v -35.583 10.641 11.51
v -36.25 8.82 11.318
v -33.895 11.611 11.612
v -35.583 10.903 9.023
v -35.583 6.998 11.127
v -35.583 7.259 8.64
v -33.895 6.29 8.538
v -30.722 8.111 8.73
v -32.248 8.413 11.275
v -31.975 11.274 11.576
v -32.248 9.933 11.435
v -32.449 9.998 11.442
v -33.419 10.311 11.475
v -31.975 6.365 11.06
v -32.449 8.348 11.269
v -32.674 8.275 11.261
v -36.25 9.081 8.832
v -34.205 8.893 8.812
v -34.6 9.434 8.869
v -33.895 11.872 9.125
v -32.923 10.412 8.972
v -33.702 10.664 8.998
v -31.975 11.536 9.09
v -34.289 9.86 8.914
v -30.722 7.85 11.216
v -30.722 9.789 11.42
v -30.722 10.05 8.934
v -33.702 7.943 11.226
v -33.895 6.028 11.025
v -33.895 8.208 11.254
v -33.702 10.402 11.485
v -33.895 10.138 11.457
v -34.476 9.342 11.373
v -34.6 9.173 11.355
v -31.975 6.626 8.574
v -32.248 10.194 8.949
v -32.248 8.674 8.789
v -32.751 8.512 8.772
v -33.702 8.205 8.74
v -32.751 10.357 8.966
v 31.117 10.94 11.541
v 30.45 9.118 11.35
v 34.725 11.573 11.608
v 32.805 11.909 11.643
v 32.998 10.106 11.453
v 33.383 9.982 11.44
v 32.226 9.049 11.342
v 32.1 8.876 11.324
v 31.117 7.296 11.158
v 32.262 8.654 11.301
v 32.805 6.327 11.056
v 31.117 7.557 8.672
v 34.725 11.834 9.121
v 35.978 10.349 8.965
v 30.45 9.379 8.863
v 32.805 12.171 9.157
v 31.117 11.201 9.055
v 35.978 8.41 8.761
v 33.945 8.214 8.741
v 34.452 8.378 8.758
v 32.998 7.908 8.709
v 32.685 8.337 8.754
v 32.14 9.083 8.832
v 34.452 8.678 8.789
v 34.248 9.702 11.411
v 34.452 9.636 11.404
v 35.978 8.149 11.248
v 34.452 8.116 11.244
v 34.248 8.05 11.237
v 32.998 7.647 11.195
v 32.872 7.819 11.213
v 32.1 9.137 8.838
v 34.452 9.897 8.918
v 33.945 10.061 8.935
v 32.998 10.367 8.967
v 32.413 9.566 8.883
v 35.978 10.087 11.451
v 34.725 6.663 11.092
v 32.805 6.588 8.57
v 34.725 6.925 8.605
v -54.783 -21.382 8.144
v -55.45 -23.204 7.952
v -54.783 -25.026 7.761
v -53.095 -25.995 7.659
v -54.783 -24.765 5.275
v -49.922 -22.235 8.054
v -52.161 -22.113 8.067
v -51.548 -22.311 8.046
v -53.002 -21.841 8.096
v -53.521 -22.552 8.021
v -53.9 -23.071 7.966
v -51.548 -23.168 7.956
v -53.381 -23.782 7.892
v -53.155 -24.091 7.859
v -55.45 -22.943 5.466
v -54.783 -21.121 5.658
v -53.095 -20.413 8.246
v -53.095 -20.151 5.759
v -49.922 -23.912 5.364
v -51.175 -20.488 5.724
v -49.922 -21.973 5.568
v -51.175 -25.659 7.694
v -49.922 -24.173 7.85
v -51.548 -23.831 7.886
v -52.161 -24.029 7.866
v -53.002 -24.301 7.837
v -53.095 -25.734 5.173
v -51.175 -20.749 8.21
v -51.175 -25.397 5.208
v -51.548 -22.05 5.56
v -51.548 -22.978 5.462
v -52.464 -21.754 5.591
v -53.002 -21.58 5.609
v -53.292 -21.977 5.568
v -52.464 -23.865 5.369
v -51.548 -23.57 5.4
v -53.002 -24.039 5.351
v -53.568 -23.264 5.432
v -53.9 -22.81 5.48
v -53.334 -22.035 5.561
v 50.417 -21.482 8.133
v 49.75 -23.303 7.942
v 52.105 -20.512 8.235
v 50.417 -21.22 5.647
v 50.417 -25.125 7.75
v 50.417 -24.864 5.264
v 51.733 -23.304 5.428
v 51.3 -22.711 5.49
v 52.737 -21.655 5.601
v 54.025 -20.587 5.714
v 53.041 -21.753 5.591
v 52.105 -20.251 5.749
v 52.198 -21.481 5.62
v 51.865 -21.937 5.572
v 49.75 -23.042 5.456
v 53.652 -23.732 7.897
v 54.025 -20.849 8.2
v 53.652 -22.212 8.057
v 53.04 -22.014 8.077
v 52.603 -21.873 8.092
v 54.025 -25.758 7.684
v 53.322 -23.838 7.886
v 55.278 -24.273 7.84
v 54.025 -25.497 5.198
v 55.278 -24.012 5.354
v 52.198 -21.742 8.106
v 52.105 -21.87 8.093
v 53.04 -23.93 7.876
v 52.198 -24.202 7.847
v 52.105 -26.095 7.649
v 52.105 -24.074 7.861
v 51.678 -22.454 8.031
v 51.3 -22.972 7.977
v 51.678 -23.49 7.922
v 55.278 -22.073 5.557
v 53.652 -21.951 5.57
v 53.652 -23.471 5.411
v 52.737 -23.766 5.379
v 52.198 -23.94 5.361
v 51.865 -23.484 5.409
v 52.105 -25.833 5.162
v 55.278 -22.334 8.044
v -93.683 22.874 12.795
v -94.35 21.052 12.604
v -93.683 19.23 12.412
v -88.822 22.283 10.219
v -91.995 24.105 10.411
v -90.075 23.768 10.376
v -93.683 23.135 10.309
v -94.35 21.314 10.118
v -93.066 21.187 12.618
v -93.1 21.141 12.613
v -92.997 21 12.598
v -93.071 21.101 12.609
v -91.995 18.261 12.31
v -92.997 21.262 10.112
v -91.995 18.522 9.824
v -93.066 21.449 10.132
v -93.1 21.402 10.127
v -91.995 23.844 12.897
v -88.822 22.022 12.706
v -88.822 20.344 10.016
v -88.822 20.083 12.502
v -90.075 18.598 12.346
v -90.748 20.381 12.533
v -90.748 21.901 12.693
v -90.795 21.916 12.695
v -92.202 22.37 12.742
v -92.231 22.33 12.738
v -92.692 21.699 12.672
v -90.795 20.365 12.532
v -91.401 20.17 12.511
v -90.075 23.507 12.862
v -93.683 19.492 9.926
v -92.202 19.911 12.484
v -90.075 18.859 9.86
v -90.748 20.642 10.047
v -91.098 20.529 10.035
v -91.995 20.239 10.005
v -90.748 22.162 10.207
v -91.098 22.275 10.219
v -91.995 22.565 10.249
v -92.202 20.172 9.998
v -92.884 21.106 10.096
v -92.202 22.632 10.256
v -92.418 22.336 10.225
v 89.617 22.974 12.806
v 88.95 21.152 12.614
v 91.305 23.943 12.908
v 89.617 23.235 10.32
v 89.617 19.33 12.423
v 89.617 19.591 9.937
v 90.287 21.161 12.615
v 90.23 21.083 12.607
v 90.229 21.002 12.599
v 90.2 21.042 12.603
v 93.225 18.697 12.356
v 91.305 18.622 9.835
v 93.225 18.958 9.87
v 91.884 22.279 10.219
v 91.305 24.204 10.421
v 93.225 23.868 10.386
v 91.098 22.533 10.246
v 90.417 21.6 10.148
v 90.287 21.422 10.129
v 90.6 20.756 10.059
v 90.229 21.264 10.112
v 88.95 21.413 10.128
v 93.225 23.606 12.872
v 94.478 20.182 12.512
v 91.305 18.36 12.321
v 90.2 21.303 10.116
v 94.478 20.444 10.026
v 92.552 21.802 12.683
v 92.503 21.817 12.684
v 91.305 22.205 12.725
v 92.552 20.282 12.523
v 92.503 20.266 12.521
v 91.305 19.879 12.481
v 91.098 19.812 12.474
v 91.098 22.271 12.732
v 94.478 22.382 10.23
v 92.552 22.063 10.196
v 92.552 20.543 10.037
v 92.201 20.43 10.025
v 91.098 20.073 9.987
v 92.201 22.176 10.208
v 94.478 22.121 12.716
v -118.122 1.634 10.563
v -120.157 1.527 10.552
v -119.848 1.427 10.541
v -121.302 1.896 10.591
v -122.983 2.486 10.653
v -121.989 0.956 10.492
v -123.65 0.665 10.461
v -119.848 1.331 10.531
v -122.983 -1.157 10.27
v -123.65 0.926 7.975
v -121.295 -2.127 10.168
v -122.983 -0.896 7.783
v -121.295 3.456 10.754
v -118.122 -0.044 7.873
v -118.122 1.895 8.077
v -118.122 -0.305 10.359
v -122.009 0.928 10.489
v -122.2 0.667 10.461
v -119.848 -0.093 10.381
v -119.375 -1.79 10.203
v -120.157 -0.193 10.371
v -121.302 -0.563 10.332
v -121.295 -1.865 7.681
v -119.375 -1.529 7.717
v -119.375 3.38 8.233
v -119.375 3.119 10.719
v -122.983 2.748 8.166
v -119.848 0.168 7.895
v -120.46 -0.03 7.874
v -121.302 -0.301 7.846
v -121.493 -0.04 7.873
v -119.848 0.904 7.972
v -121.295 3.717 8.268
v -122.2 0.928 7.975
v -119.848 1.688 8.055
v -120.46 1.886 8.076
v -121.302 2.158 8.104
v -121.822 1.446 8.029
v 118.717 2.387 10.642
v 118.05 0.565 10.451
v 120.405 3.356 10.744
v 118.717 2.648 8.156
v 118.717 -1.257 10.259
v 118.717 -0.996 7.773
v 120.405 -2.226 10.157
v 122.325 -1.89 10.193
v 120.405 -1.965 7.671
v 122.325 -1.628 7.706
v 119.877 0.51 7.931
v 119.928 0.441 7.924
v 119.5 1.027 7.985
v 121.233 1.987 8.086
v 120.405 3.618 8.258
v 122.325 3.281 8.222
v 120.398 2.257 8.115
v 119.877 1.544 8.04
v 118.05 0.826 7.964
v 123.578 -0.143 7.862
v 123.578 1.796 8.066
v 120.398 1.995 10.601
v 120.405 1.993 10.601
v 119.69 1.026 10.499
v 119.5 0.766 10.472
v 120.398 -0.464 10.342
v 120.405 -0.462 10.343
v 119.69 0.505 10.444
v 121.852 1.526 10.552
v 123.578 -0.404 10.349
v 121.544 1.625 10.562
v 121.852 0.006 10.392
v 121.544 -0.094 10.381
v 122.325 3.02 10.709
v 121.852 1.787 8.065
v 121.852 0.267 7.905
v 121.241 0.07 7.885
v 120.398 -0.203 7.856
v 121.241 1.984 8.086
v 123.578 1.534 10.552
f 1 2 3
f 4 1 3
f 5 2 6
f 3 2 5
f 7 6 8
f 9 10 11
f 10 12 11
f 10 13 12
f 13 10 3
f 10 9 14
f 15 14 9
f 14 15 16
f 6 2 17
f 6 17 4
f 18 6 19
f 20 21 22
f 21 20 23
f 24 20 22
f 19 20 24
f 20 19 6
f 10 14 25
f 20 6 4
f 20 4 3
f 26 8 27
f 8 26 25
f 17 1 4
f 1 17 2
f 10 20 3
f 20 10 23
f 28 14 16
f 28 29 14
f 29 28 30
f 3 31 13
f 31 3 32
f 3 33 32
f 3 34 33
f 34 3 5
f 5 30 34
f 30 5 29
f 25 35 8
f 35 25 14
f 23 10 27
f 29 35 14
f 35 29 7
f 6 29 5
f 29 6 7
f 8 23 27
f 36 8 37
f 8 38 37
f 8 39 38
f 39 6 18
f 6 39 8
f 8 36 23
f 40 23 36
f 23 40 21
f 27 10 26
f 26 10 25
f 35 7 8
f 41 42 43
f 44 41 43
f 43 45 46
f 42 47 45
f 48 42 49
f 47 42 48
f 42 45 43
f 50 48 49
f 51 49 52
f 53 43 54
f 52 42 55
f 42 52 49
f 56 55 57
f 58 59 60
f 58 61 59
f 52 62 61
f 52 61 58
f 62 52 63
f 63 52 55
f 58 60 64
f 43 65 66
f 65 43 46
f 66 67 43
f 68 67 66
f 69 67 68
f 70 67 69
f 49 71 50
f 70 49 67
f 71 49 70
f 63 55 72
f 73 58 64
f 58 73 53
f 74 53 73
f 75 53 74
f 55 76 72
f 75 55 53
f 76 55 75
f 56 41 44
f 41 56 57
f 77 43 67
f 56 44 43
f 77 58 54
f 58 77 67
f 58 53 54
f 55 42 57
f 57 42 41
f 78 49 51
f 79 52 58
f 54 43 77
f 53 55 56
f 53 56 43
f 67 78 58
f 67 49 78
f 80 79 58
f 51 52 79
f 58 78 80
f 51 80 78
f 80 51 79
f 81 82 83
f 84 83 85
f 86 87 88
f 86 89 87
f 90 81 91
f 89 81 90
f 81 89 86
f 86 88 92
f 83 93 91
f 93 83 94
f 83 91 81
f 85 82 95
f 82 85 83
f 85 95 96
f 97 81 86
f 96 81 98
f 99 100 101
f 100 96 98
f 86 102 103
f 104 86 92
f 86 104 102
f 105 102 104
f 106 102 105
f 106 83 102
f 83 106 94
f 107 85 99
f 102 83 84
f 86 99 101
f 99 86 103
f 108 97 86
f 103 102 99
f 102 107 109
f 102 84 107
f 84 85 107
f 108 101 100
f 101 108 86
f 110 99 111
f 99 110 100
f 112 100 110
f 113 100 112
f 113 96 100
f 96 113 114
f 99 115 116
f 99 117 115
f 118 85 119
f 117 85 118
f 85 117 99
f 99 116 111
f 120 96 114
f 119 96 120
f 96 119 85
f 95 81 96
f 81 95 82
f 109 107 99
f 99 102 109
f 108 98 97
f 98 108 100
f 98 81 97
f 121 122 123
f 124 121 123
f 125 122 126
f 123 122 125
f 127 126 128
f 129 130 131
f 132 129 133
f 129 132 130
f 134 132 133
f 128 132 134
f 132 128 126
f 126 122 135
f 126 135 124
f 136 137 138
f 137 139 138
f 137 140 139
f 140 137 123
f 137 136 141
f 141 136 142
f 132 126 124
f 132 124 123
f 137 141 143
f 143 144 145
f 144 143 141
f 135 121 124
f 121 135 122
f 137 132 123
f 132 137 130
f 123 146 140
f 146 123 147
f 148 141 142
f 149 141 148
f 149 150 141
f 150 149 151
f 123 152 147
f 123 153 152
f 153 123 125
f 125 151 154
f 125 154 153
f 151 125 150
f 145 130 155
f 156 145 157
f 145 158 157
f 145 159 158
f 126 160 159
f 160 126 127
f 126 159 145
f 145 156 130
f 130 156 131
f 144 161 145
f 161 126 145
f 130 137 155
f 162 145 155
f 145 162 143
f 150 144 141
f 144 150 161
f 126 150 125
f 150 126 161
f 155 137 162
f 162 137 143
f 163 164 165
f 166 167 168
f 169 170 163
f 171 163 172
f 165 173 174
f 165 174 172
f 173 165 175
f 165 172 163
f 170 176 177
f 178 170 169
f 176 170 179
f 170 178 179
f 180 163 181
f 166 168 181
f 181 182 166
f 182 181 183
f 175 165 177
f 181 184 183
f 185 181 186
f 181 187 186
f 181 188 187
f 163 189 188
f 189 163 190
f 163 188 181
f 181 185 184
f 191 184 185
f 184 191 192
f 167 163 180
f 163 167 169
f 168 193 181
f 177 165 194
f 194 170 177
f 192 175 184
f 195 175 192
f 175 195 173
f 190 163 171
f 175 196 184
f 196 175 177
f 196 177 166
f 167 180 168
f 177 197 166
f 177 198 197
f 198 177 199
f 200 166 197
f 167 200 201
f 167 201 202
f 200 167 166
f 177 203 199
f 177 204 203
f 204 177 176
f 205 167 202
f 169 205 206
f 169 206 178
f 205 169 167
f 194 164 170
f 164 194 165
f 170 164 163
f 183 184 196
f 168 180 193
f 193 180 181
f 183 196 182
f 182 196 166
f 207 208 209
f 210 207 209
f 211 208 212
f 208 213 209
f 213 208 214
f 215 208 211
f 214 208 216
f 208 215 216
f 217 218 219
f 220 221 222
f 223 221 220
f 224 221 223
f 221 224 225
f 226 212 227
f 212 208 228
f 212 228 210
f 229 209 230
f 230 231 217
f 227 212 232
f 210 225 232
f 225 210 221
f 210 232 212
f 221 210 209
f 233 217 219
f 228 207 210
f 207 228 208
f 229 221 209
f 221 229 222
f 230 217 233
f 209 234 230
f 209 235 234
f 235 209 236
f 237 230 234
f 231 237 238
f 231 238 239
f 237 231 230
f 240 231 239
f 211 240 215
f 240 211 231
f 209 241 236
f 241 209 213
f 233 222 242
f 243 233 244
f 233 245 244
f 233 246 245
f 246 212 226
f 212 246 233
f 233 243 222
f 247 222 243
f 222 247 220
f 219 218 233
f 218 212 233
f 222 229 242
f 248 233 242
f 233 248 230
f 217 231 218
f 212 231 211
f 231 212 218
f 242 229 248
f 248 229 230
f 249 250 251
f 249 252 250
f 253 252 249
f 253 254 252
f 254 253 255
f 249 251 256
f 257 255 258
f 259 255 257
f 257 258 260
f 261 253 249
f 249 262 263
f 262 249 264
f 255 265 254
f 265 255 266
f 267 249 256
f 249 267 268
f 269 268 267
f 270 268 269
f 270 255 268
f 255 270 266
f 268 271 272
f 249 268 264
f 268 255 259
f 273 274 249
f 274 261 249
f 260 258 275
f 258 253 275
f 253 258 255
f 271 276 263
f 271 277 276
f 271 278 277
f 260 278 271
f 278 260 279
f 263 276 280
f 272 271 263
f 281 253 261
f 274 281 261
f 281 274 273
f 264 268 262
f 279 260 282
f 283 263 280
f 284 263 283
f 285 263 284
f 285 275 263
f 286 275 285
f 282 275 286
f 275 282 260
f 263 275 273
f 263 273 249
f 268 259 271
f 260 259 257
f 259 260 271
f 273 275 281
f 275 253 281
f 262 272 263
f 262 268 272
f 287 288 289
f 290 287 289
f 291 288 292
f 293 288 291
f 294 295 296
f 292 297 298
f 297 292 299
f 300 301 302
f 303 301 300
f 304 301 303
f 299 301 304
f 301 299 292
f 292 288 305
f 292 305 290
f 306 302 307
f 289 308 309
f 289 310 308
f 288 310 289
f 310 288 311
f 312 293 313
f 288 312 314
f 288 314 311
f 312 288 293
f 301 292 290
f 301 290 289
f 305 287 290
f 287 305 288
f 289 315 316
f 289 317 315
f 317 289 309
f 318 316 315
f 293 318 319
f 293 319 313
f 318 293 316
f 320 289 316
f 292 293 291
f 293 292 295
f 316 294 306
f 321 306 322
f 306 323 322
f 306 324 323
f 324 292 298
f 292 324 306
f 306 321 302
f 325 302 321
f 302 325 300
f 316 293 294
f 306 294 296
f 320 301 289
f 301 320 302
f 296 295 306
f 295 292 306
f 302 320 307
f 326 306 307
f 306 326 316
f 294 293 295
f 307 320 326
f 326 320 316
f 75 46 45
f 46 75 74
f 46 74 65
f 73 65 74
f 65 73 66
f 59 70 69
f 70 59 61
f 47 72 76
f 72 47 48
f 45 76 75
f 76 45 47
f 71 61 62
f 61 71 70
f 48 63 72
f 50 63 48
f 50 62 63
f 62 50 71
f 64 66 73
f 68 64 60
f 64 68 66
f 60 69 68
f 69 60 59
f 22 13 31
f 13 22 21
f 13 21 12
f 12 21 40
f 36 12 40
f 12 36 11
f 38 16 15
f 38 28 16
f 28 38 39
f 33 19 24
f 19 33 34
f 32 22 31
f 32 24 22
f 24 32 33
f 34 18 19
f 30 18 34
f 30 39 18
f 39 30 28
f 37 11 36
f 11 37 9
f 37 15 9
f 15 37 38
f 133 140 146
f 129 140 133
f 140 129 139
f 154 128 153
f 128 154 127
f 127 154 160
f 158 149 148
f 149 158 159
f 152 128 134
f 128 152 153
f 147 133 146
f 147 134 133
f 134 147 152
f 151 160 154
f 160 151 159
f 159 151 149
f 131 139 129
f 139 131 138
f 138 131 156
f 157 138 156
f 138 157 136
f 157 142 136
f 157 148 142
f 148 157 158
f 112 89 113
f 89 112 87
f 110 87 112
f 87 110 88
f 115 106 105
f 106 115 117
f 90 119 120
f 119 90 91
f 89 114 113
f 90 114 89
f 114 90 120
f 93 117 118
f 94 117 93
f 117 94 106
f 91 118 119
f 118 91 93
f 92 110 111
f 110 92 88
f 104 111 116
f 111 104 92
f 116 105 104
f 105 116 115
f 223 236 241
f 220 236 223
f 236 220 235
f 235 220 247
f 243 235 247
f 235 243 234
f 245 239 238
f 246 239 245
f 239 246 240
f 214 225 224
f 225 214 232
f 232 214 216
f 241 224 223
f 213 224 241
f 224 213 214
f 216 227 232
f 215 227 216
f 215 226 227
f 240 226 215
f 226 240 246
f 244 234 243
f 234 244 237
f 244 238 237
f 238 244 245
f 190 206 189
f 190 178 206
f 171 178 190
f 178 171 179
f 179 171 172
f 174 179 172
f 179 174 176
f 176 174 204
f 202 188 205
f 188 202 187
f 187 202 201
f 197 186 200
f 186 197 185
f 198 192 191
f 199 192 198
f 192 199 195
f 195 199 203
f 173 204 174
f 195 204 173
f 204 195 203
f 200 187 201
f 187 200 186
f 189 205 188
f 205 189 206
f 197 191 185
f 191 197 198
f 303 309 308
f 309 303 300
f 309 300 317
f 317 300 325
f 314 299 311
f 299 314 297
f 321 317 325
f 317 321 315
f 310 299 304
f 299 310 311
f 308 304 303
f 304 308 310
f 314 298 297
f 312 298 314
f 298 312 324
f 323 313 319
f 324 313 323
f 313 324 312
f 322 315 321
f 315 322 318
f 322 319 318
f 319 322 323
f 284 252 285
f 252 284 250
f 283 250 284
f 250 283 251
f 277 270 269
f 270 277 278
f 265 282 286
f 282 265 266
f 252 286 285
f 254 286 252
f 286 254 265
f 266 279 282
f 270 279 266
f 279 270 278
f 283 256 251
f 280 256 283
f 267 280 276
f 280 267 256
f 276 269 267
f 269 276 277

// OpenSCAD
pcb_thickness = 1.6;
pcb_inner_margin = 1.5;
pcb_outer_margin = 1;

battery_width = 30;
battery_height = 35;
battery_thickness = 5;

case_height = 12;
case_thickness = 1.5;
component_thickness = 2.5;
shell_margin = 3;

tilt_angle = 6;

mounting_hole_diameter = 2.5;
mounting_hole_locations = [
    [33.4, 8.7], [-33.3, 9],
    [52.6, -23.5], [-52.6, -23.6],
    [91.5, 21], [-91.8, 21.1],
    [120.8, 0.5], [-120.9, 0.4]
];

module dxf_layer(name) {
    translate([-148.739, 100, 0])
    import("osprette.dxf", layer=name, center=true);
}

module pcb() dxf_layer("Edge");
module components() dxf_layer("BFab");
module holes() dxf_layer("FCrtYd");

module orient_to_top_of_case() {
    translate([0, 0, case_height])
    rotate([180 - tilt_angle, 0, 180])
    children();
}

module shell() {
    rotate([180 - tilt_angle, 0, 180])
    linear_extrude(case_height * 2, center=true)
    offset(delta=(pcb_outer_margin + shell_margin))
    pcb();
}

module component_tray() {
    orient_to_top_of_case()
    linear_extrude(2 * (pcb_thickness + component_thickness), center=true)
    offset(delta=-pcb_inner_margin)
    pcb();
}

module pcb_tray() {
    orient_to_top_of_case()
    linear_extrude(2 * pcb_thickness, center=true)
    offset(delta=pcb_outer_margin)
    pcb();
}

module battery_cutout() {
    translate([0, -14.5, case_thickness])
    linear_extrude(case_height * 2, center=false)
    square([battery_width, battery_height], center=true);
}

module usb_cutout() {
    orient_to_top_of_case()
    linear_extrude((pcb_thickness + 1.5) * 2, center=true)
    square([16, 50], center=true);
}

module finger_cutout() {
    orient_to_top_of_case()
    translate([0, 16.8, 5])
    linear_extrude(case_height * 2, center=true)
    square([16, 20], center=true);
}

module power_switch_cutout() {
    rotate([tilt_angle, 0, 0])
    rotate([0, 90, 0])
    linear_extrude(16, center=true)
    offset(delta=5, chamfer=true)
    translate([-11.5, 12.2, 0])
    square(4, center=true);
}

module mounting_hole_struts() {
    for (location = mounting_hole_locations) {
        orient_to_top_of_case()
        translate([location[0], location[1], pcb_thickness])
        linear_extrude(component_thickness, center=false)
        circle(2.85);
    }
}

module mounting_drill_holes() {
    for (location = mounting_hole_locations) {
         translate([location[0], location[1], 1])
        orient_to_top_of_case()
        linear_extrude(case_height, center=false)
        circle(1.3);
    }
}

module mounting_hole_countersinks() {
    for (location = mounting_hole_locations) {
        orient_to_top_of_case()
        translate([location[0], location[1], pcb_thickness + component_thickness + case_thickness + 1])
        linear_extrude(case_height * 4, center=false)
        circle(2.85);
        
    }
}

%
orient_to_top_of_case()
linear_extrude(pcb_thickness)
pcb();

difference() {
    union() {
        intersection() {
            difference() {
                shell();
                pcb_tray();
                component_tray();
                battery_cutout();
                usb_cutout();
                finger_cutout();
                power_switch_cutout();
                mounting_hole_countersinks();
            };
            translate([0, 0, 500])
            cube(1000, center=true);
        };
        mounting_hole_struts();
    };
    mounting_drill_holes();
};
